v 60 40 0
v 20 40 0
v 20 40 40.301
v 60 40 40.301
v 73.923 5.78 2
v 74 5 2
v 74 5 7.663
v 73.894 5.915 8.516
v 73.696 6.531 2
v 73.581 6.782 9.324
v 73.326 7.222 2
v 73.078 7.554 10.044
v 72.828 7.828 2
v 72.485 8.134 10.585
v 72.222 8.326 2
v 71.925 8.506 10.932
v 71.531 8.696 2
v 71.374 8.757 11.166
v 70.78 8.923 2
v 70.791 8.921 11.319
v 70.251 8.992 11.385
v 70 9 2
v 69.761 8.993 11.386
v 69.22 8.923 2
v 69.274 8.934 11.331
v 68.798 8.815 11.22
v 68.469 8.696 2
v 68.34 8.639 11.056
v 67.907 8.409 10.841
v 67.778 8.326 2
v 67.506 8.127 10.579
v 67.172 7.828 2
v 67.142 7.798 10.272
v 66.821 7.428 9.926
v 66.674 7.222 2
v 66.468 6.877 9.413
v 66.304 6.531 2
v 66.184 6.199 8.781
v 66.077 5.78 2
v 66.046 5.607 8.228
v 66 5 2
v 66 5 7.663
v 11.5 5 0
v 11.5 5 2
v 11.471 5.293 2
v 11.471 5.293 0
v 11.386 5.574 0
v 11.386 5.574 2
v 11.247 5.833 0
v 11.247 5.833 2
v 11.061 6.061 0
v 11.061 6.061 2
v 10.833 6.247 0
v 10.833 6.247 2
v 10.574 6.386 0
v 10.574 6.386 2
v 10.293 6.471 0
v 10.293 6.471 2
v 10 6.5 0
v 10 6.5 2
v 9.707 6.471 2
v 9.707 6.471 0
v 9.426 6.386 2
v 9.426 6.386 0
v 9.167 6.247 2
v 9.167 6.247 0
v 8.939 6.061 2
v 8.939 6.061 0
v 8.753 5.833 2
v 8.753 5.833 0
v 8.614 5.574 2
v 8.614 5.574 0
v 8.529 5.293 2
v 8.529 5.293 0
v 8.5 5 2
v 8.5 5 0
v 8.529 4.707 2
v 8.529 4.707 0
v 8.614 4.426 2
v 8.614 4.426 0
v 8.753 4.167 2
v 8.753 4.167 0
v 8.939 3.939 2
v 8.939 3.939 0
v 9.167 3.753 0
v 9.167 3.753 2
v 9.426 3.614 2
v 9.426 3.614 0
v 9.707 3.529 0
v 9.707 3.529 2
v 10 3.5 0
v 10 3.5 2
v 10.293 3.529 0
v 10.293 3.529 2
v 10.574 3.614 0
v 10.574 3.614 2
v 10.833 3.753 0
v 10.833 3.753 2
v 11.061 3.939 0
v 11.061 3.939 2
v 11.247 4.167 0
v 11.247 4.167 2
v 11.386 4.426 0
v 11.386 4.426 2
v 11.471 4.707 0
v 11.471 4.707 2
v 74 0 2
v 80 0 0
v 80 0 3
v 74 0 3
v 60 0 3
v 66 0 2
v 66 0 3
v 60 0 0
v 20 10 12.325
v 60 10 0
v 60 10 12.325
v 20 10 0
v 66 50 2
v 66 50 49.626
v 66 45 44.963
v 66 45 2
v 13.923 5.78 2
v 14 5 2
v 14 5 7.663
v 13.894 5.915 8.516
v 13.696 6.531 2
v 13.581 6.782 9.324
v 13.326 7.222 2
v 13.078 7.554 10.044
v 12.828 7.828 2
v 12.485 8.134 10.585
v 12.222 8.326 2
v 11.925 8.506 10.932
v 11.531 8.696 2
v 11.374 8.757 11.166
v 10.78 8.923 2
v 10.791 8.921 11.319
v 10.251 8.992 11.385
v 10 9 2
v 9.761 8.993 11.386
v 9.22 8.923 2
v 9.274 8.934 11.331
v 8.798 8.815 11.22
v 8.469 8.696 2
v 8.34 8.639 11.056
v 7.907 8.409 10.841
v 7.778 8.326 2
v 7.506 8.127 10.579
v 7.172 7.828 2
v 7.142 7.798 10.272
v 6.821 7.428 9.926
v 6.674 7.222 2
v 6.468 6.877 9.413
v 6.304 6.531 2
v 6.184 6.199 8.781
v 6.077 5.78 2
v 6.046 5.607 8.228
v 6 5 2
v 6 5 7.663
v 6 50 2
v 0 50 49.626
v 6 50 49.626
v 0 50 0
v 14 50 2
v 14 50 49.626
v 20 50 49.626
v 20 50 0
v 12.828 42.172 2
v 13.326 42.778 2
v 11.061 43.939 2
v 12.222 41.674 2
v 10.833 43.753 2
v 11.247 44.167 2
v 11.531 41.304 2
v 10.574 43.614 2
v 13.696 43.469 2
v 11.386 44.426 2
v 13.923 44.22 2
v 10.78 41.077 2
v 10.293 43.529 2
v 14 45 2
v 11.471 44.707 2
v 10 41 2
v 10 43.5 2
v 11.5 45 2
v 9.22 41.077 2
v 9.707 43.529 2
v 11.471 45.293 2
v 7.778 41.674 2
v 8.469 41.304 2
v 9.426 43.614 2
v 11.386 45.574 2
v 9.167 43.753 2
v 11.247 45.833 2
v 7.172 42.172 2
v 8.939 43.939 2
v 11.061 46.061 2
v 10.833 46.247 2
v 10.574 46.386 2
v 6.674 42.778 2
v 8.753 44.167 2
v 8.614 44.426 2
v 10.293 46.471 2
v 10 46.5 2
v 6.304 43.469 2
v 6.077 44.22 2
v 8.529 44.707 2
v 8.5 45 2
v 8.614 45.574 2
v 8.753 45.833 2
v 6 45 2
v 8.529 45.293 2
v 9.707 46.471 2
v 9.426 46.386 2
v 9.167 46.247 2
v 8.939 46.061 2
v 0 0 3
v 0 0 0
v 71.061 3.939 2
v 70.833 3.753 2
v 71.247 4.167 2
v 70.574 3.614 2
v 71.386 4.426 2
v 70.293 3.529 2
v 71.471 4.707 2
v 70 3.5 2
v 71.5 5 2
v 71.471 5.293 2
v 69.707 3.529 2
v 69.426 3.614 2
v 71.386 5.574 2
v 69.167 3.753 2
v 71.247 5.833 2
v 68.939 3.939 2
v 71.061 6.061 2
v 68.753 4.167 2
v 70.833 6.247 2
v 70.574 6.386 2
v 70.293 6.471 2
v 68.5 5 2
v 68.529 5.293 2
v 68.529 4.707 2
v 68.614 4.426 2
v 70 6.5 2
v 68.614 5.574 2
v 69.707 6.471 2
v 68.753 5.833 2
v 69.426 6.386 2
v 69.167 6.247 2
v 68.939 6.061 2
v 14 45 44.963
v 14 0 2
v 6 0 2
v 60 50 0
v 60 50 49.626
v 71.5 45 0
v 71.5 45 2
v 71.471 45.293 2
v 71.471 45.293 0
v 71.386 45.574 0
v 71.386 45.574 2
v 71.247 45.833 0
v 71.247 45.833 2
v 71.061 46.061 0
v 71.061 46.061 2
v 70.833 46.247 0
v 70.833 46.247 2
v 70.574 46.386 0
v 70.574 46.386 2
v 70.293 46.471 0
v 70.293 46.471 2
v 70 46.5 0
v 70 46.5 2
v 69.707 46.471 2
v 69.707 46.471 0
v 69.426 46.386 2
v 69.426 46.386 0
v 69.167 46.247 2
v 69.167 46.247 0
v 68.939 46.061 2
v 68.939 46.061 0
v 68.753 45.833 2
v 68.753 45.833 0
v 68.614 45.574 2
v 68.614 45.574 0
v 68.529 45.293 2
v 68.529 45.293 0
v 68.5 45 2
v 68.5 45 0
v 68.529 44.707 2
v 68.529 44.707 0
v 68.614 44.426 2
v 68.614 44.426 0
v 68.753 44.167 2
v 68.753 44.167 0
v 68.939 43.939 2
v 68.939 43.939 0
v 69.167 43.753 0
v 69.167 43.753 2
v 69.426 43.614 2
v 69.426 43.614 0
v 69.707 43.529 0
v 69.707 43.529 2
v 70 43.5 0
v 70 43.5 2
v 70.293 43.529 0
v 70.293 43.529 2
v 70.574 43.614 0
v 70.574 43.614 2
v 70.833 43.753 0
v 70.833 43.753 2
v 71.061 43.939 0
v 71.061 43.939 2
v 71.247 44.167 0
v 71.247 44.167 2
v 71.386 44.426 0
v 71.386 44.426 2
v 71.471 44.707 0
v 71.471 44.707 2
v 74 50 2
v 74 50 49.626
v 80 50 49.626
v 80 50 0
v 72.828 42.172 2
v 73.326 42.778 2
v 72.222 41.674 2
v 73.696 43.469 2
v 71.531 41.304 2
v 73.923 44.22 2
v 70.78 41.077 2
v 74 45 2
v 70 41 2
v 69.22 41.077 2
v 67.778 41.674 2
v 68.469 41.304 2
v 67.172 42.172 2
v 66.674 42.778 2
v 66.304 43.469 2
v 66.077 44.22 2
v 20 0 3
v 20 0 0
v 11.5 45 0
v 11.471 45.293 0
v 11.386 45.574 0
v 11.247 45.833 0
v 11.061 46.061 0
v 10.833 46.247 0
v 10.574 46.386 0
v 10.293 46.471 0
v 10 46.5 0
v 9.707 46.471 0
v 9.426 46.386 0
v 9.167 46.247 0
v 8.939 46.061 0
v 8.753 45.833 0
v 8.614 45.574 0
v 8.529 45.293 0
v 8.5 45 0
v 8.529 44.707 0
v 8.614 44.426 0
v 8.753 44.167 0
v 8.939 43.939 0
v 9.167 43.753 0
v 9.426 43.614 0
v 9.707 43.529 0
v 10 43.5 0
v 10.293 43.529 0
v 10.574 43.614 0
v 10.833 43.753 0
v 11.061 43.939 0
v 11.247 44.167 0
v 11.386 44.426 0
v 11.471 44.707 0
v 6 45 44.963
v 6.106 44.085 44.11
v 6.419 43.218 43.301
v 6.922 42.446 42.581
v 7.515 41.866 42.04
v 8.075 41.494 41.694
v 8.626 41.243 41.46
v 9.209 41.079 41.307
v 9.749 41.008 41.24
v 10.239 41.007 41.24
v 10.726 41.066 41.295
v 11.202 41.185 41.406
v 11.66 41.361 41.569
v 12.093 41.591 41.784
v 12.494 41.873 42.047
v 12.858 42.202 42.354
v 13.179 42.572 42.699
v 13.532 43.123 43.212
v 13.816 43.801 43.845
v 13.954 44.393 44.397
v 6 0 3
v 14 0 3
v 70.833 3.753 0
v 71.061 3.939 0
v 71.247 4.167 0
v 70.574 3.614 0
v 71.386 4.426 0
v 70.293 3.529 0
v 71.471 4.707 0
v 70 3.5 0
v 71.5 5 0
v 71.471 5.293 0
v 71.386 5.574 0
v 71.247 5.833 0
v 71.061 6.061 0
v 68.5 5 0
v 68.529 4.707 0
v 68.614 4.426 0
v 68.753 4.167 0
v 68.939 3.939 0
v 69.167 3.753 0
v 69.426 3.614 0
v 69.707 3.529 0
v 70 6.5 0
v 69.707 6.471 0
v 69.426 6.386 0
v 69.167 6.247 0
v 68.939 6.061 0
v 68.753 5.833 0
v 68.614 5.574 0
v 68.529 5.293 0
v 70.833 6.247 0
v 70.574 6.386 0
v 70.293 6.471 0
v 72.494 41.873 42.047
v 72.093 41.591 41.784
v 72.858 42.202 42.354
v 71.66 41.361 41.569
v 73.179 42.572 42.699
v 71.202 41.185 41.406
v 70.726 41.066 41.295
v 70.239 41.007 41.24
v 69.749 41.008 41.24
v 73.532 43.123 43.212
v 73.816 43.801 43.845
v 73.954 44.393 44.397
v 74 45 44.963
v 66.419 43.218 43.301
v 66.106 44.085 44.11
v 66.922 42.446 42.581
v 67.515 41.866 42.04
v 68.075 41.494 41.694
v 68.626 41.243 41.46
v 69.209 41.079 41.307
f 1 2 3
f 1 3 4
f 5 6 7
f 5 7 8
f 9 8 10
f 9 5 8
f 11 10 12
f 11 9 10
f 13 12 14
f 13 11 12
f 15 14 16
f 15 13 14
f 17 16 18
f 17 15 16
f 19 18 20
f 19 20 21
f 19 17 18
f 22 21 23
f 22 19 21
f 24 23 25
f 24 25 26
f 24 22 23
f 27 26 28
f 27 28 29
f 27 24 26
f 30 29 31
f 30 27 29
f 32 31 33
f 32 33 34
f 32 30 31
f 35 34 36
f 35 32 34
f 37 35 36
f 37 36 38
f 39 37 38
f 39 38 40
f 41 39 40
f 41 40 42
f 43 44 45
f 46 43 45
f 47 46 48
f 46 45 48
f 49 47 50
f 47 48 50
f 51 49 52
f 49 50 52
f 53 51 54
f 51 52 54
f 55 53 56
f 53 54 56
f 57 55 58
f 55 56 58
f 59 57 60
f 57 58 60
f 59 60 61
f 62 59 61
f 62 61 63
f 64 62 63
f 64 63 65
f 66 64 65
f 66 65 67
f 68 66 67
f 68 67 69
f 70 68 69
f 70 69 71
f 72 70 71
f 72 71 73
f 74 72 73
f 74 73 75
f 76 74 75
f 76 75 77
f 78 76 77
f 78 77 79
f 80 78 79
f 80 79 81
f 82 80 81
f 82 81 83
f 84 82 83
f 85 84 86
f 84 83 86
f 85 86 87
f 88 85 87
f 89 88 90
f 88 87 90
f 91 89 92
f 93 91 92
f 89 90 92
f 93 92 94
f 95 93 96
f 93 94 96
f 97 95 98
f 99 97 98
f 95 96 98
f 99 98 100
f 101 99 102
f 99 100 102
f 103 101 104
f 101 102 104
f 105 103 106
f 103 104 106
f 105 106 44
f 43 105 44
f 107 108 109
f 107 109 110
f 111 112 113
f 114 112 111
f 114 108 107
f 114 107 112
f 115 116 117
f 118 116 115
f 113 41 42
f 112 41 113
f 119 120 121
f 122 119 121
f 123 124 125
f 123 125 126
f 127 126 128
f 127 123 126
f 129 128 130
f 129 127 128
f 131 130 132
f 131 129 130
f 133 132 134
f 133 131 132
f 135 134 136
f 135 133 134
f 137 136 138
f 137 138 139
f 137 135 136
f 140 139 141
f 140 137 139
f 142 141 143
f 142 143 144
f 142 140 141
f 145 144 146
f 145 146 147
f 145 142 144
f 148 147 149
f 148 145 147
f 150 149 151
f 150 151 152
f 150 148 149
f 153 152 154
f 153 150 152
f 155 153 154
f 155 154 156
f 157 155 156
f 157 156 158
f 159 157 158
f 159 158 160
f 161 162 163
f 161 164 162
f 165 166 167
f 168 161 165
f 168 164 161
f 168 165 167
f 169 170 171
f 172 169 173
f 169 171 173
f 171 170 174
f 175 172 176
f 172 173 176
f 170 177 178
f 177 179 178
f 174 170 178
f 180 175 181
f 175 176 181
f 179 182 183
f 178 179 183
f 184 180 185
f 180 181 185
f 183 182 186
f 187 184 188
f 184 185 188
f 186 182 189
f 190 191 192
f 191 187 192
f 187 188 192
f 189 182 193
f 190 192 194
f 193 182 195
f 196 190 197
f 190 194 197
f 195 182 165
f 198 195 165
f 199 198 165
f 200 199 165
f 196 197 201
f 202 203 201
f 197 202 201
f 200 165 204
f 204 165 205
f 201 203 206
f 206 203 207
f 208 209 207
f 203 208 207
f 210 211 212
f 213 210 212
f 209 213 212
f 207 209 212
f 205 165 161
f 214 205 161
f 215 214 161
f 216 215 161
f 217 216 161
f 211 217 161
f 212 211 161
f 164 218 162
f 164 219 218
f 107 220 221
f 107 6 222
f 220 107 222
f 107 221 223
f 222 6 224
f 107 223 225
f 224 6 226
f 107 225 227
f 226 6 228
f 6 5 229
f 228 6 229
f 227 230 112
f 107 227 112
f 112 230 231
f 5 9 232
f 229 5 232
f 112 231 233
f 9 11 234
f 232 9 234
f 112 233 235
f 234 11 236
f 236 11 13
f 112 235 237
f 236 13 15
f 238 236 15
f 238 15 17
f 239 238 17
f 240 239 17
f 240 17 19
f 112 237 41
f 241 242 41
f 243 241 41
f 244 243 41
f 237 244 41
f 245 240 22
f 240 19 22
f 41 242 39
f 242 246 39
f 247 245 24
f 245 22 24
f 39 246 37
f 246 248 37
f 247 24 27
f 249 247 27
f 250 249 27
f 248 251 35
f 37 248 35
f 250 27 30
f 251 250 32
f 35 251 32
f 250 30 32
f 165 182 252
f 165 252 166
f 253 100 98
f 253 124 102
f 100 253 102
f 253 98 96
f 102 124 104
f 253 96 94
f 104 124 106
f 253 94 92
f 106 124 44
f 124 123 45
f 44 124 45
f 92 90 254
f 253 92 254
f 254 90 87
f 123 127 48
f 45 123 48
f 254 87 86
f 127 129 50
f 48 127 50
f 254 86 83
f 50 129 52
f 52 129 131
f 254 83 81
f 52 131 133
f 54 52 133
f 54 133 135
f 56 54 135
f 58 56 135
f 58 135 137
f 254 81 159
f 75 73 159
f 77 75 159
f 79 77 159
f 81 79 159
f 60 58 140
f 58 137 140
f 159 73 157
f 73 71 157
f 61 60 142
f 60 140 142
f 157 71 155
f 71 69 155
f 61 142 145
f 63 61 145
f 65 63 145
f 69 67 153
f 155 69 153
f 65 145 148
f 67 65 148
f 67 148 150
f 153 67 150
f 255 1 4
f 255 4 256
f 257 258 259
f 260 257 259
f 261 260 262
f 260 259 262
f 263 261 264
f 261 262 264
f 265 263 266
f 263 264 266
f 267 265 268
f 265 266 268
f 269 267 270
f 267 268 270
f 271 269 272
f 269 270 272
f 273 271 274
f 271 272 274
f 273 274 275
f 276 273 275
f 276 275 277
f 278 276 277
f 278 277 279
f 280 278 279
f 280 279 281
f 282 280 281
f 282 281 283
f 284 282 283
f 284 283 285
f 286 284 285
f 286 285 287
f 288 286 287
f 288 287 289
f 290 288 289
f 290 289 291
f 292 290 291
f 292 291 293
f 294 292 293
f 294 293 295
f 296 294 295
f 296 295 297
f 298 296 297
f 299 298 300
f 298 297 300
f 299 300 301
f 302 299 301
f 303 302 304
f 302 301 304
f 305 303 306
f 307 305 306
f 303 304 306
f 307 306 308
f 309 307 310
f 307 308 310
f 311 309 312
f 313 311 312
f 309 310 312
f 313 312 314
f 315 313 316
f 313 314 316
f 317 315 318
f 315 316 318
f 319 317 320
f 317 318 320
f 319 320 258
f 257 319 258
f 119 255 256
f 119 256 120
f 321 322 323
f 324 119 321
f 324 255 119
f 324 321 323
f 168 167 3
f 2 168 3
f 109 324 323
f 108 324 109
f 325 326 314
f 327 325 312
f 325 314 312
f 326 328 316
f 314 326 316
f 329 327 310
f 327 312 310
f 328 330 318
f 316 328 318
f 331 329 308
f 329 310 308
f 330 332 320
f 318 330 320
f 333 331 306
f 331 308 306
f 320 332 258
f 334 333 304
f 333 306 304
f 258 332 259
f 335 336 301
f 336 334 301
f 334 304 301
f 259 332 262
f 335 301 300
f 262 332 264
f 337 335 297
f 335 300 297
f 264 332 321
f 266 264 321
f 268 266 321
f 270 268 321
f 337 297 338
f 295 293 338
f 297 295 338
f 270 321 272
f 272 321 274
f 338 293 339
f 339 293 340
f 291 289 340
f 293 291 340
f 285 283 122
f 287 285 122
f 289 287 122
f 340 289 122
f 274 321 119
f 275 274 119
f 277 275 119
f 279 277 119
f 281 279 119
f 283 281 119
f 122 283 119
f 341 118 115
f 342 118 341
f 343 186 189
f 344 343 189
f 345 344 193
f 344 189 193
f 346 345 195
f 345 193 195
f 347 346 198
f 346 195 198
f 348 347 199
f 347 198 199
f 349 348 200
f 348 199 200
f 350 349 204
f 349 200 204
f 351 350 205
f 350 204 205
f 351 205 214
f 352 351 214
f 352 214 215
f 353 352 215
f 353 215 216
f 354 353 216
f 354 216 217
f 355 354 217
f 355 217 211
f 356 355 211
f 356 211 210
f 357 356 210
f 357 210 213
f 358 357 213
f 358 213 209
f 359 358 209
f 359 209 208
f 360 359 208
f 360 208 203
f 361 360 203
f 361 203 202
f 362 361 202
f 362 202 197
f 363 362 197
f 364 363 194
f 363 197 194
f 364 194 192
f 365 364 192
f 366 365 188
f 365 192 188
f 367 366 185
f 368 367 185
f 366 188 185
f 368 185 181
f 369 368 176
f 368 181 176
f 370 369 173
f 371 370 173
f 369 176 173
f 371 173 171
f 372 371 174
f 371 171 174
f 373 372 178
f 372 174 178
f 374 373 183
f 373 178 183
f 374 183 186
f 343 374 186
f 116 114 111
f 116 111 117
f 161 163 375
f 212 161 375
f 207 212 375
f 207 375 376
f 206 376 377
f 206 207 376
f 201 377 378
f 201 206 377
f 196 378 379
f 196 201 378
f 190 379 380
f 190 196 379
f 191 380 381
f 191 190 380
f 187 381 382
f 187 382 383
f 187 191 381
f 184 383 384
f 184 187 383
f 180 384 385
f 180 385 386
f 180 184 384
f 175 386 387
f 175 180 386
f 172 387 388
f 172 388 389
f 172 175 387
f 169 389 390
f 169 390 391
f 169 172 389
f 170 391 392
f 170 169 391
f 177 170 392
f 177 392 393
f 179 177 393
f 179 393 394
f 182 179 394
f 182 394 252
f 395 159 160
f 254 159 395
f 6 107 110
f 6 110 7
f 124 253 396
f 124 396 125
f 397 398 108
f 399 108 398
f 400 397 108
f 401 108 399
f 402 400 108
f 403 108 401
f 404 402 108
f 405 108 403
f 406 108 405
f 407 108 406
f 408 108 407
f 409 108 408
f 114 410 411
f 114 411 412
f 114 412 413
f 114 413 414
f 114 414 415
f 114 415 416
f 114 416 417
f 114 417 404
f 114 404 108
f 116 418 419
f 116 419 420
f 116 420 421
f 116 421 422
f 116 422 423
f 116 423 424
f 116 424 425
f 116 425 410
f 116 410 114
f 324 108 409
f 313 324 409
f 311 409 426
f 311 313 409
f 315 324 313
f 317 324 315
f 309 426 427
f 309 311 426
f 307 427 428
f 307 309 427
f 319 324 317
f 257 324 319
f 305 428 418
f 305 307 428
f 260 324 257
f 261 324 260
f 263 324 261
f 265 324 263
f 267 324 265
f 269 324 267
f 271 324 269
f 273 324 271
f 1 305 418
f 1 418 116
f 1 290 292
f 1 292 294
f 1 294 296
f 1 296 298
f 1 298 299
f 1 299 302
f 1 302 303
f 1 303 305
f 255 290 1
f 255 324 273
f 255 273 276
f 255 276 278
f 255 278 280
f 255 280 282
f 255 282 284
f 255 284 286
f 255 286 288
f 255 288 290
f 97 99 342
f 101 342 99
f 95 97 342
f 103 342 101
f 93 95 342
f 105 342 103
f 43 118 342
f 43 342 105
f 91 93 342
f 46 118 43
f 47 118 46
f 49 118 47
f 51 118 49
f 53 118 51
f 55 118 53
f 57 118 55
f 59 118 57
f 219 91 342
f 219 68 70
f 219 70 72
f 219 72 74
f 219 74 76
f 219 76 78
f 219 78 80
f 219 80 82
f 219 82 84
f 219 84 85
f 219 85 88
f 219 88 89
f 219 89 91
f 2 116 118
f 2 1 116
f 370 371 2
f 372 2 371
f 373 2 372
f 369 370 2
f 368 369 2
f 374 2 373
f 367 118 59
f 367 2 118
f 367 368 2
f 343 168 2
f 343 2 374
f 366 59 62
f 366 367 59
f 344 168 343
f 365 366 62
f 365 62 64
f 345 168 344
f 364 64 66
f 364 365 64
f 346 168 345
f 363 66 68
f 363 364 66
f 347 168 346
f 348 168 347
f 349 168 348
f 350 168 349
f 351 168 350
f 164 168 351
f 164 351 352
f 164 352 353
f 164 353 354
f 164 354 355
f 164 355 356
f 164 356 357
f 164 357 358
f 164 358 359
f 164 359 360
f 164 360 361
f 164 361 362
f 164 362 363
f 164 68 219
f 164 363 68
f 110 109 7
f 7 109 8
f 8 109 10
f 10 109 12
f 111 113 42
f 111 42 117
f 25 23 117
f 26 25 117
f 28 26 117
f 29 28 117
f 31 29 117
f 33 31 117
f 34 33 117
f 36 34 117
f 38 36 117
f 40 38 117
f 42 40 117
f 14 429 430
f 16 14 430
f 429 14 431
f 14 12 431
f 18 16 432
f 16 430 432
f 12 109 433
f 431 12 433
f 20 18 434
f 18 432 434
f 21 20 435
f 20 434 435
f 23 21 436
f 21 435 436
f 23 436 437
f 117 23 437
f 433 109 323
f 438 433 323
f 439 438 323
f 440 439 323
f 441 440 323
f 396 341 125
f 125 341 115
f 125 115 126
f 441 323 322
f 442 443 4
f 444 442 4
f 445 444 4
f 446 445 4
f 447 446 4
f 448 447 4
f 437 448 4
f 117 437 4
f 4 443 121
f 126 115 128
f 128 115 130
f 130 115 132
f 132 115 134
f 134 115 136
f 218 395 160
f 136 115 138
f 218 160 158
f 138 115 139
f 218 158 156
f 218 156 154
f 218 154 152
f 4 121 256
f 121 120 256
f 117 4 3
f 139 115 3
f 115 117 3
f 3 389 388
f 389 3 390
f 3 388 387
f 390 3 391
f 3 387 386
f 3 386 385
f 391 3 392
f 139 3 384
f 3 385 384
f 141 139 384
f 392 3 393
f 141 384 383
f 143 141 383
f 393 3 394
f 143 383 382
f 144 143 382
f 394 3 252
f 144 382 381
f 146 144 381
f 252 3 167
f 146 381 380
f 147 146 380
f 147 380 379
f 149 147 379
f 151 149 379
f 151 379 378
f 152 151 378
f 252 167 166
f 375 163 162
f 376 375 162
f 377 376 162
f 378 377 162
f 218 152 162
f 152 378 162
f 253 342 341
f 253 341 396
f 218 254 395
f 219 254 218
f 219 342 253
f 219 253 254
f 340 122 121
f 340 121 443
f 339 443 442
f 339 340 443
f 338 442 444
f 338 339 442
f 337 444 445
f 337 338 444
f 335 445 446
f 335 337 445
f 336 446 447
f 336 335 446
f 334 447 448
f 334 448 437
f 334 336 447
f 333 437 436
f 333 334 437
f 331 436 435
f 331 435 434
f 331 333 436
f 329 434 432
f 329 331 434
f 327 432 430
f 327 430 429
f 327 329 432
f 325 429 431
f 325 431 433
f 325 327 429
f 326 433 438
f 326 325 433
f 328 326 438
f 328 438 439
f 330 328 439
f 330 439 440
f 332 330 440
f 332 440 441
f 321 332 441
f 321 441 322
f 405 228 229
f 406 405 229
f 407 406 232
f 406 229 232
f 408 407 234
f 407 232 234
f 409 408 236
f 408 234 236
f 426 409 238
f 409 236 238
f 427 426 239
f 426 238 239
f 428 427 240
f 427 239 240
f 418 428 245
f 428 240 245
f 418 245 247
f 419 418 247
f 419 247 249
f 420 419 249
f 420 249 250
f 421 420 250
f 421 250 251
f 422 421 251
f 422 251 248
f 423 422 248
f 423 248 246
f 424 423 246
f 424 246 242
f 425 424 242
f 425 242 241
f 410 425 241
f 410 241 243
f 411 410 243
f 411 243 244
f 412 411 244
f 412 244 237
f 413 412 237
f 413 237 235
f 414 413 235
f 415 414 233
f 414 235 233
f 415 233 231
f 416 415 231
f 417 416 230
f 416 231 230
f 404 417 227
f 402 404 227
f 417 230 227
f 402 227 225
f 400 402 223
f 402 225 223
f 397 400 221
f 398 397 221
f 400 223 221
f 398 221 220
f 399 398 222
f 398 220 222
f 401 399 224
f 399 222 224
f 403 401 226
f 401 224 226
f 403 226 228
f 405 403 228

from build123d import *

# Parameters (mm, degrees)
EXTRUDE_2_DEPTH     = 2
SKETCH_3_R          = 1.5
CUT_EXTRUDE_1_DEPTH = 95.361008897
EXTRUDE_3_DEPTH     = 1
DRAFT_4_ANGLE       = 43


with BuildPart() as part:
    # 草图1 → 凸台-拉伸2 (new body)
    with BuildSketch(Plane.XY):
        Polygon((0, 0), (0, 50), (20, 50), (20, 40), (60, 40), (60, 50), (80, 50), (80, 0), (60, 0), (60, 10), (20, 10), (20, 0), align=None)
    extrude(amount=EXTRUDE_2_DEPTH)

    # 草图3 → 切除-拉伸1 (cut, through all)
    with BuildSketch(Plane.XY.offset(2)):
        with Locations((10, 45)):
            Circle(SKETCH_3_R)
        with Locations((10, 5)):
            Circle(SKETCH_3_R)
        with Locations((70, 45)):
            Circle(SKETCH_3_R)
        with Locations((70, 5)):
            Circle(SKETCH_3_R)
    extrude(amount=-CUT_EXTRUDE_1_DEPTH, mode=Mode.SUBTRACT)

    # 草图5 → 凸台-拉伸3 (add)
    with BuildSketch(Plane.XY.offset(2)):
        with BuildLine():
            Line((0, 50), (6, 50))
            Line((6, 50), (6, 45))
            ThreePointArc((6, 45), (10, 41), (14, 45))
            Line((14, 45), (14, 50))
            Line((14, 50), (20, 50))
            Line((20, 50), (20, 40))
            Line((20, 40), (60, 40))
            Line((60, 40), (60, 50))
            Line((60, 50), (66, 50))
            Line((66, 50), (66, 45))
            ThreePointArc((66, 45), (70, 41), (74, 45))
            Line((74, 45), (74, 50))
            Line((74, 50), (80, 50))
            Line((80, 50), (80, 0))
            Line((80, 0), (74, 0))
            Line((74, 0), (74, 5))
            ThreePointArc((74, 5), (70, 9), (66, 5))
            Line((66, 5), (66, 0))
            Line((66, 0), (60, 0))
            Line((60, 0), (60, 10))
            Line((60, 10), (20, 10))
            Line((20, 10), (20, 0))
            Line((20, 0), (14, 0))
            Line((14, 0), (14, 5))
            ThreePointArc((14, 5), (10, 9), (6, 5))
            Line((6, 5), (6, 0))
            Line((6, 0), (0, 0))
            Line((0, 0), (0, 50))
        make_face()
    extrude(amount=EXTRUDE_3_DEPTH)

    # 拔模4
    draft_4_faces = [part.faces().sort_by_distance(p)[0] for p in [
        (40, 25, 3),
    ]]
    draft(draft_4_faces, Plane(origin=(20, 0, 2), x_dir=(-1, 0, 0), z_dir=(0, -1, 0)), DRAFT_4_ANGLE)


solid = part.part
